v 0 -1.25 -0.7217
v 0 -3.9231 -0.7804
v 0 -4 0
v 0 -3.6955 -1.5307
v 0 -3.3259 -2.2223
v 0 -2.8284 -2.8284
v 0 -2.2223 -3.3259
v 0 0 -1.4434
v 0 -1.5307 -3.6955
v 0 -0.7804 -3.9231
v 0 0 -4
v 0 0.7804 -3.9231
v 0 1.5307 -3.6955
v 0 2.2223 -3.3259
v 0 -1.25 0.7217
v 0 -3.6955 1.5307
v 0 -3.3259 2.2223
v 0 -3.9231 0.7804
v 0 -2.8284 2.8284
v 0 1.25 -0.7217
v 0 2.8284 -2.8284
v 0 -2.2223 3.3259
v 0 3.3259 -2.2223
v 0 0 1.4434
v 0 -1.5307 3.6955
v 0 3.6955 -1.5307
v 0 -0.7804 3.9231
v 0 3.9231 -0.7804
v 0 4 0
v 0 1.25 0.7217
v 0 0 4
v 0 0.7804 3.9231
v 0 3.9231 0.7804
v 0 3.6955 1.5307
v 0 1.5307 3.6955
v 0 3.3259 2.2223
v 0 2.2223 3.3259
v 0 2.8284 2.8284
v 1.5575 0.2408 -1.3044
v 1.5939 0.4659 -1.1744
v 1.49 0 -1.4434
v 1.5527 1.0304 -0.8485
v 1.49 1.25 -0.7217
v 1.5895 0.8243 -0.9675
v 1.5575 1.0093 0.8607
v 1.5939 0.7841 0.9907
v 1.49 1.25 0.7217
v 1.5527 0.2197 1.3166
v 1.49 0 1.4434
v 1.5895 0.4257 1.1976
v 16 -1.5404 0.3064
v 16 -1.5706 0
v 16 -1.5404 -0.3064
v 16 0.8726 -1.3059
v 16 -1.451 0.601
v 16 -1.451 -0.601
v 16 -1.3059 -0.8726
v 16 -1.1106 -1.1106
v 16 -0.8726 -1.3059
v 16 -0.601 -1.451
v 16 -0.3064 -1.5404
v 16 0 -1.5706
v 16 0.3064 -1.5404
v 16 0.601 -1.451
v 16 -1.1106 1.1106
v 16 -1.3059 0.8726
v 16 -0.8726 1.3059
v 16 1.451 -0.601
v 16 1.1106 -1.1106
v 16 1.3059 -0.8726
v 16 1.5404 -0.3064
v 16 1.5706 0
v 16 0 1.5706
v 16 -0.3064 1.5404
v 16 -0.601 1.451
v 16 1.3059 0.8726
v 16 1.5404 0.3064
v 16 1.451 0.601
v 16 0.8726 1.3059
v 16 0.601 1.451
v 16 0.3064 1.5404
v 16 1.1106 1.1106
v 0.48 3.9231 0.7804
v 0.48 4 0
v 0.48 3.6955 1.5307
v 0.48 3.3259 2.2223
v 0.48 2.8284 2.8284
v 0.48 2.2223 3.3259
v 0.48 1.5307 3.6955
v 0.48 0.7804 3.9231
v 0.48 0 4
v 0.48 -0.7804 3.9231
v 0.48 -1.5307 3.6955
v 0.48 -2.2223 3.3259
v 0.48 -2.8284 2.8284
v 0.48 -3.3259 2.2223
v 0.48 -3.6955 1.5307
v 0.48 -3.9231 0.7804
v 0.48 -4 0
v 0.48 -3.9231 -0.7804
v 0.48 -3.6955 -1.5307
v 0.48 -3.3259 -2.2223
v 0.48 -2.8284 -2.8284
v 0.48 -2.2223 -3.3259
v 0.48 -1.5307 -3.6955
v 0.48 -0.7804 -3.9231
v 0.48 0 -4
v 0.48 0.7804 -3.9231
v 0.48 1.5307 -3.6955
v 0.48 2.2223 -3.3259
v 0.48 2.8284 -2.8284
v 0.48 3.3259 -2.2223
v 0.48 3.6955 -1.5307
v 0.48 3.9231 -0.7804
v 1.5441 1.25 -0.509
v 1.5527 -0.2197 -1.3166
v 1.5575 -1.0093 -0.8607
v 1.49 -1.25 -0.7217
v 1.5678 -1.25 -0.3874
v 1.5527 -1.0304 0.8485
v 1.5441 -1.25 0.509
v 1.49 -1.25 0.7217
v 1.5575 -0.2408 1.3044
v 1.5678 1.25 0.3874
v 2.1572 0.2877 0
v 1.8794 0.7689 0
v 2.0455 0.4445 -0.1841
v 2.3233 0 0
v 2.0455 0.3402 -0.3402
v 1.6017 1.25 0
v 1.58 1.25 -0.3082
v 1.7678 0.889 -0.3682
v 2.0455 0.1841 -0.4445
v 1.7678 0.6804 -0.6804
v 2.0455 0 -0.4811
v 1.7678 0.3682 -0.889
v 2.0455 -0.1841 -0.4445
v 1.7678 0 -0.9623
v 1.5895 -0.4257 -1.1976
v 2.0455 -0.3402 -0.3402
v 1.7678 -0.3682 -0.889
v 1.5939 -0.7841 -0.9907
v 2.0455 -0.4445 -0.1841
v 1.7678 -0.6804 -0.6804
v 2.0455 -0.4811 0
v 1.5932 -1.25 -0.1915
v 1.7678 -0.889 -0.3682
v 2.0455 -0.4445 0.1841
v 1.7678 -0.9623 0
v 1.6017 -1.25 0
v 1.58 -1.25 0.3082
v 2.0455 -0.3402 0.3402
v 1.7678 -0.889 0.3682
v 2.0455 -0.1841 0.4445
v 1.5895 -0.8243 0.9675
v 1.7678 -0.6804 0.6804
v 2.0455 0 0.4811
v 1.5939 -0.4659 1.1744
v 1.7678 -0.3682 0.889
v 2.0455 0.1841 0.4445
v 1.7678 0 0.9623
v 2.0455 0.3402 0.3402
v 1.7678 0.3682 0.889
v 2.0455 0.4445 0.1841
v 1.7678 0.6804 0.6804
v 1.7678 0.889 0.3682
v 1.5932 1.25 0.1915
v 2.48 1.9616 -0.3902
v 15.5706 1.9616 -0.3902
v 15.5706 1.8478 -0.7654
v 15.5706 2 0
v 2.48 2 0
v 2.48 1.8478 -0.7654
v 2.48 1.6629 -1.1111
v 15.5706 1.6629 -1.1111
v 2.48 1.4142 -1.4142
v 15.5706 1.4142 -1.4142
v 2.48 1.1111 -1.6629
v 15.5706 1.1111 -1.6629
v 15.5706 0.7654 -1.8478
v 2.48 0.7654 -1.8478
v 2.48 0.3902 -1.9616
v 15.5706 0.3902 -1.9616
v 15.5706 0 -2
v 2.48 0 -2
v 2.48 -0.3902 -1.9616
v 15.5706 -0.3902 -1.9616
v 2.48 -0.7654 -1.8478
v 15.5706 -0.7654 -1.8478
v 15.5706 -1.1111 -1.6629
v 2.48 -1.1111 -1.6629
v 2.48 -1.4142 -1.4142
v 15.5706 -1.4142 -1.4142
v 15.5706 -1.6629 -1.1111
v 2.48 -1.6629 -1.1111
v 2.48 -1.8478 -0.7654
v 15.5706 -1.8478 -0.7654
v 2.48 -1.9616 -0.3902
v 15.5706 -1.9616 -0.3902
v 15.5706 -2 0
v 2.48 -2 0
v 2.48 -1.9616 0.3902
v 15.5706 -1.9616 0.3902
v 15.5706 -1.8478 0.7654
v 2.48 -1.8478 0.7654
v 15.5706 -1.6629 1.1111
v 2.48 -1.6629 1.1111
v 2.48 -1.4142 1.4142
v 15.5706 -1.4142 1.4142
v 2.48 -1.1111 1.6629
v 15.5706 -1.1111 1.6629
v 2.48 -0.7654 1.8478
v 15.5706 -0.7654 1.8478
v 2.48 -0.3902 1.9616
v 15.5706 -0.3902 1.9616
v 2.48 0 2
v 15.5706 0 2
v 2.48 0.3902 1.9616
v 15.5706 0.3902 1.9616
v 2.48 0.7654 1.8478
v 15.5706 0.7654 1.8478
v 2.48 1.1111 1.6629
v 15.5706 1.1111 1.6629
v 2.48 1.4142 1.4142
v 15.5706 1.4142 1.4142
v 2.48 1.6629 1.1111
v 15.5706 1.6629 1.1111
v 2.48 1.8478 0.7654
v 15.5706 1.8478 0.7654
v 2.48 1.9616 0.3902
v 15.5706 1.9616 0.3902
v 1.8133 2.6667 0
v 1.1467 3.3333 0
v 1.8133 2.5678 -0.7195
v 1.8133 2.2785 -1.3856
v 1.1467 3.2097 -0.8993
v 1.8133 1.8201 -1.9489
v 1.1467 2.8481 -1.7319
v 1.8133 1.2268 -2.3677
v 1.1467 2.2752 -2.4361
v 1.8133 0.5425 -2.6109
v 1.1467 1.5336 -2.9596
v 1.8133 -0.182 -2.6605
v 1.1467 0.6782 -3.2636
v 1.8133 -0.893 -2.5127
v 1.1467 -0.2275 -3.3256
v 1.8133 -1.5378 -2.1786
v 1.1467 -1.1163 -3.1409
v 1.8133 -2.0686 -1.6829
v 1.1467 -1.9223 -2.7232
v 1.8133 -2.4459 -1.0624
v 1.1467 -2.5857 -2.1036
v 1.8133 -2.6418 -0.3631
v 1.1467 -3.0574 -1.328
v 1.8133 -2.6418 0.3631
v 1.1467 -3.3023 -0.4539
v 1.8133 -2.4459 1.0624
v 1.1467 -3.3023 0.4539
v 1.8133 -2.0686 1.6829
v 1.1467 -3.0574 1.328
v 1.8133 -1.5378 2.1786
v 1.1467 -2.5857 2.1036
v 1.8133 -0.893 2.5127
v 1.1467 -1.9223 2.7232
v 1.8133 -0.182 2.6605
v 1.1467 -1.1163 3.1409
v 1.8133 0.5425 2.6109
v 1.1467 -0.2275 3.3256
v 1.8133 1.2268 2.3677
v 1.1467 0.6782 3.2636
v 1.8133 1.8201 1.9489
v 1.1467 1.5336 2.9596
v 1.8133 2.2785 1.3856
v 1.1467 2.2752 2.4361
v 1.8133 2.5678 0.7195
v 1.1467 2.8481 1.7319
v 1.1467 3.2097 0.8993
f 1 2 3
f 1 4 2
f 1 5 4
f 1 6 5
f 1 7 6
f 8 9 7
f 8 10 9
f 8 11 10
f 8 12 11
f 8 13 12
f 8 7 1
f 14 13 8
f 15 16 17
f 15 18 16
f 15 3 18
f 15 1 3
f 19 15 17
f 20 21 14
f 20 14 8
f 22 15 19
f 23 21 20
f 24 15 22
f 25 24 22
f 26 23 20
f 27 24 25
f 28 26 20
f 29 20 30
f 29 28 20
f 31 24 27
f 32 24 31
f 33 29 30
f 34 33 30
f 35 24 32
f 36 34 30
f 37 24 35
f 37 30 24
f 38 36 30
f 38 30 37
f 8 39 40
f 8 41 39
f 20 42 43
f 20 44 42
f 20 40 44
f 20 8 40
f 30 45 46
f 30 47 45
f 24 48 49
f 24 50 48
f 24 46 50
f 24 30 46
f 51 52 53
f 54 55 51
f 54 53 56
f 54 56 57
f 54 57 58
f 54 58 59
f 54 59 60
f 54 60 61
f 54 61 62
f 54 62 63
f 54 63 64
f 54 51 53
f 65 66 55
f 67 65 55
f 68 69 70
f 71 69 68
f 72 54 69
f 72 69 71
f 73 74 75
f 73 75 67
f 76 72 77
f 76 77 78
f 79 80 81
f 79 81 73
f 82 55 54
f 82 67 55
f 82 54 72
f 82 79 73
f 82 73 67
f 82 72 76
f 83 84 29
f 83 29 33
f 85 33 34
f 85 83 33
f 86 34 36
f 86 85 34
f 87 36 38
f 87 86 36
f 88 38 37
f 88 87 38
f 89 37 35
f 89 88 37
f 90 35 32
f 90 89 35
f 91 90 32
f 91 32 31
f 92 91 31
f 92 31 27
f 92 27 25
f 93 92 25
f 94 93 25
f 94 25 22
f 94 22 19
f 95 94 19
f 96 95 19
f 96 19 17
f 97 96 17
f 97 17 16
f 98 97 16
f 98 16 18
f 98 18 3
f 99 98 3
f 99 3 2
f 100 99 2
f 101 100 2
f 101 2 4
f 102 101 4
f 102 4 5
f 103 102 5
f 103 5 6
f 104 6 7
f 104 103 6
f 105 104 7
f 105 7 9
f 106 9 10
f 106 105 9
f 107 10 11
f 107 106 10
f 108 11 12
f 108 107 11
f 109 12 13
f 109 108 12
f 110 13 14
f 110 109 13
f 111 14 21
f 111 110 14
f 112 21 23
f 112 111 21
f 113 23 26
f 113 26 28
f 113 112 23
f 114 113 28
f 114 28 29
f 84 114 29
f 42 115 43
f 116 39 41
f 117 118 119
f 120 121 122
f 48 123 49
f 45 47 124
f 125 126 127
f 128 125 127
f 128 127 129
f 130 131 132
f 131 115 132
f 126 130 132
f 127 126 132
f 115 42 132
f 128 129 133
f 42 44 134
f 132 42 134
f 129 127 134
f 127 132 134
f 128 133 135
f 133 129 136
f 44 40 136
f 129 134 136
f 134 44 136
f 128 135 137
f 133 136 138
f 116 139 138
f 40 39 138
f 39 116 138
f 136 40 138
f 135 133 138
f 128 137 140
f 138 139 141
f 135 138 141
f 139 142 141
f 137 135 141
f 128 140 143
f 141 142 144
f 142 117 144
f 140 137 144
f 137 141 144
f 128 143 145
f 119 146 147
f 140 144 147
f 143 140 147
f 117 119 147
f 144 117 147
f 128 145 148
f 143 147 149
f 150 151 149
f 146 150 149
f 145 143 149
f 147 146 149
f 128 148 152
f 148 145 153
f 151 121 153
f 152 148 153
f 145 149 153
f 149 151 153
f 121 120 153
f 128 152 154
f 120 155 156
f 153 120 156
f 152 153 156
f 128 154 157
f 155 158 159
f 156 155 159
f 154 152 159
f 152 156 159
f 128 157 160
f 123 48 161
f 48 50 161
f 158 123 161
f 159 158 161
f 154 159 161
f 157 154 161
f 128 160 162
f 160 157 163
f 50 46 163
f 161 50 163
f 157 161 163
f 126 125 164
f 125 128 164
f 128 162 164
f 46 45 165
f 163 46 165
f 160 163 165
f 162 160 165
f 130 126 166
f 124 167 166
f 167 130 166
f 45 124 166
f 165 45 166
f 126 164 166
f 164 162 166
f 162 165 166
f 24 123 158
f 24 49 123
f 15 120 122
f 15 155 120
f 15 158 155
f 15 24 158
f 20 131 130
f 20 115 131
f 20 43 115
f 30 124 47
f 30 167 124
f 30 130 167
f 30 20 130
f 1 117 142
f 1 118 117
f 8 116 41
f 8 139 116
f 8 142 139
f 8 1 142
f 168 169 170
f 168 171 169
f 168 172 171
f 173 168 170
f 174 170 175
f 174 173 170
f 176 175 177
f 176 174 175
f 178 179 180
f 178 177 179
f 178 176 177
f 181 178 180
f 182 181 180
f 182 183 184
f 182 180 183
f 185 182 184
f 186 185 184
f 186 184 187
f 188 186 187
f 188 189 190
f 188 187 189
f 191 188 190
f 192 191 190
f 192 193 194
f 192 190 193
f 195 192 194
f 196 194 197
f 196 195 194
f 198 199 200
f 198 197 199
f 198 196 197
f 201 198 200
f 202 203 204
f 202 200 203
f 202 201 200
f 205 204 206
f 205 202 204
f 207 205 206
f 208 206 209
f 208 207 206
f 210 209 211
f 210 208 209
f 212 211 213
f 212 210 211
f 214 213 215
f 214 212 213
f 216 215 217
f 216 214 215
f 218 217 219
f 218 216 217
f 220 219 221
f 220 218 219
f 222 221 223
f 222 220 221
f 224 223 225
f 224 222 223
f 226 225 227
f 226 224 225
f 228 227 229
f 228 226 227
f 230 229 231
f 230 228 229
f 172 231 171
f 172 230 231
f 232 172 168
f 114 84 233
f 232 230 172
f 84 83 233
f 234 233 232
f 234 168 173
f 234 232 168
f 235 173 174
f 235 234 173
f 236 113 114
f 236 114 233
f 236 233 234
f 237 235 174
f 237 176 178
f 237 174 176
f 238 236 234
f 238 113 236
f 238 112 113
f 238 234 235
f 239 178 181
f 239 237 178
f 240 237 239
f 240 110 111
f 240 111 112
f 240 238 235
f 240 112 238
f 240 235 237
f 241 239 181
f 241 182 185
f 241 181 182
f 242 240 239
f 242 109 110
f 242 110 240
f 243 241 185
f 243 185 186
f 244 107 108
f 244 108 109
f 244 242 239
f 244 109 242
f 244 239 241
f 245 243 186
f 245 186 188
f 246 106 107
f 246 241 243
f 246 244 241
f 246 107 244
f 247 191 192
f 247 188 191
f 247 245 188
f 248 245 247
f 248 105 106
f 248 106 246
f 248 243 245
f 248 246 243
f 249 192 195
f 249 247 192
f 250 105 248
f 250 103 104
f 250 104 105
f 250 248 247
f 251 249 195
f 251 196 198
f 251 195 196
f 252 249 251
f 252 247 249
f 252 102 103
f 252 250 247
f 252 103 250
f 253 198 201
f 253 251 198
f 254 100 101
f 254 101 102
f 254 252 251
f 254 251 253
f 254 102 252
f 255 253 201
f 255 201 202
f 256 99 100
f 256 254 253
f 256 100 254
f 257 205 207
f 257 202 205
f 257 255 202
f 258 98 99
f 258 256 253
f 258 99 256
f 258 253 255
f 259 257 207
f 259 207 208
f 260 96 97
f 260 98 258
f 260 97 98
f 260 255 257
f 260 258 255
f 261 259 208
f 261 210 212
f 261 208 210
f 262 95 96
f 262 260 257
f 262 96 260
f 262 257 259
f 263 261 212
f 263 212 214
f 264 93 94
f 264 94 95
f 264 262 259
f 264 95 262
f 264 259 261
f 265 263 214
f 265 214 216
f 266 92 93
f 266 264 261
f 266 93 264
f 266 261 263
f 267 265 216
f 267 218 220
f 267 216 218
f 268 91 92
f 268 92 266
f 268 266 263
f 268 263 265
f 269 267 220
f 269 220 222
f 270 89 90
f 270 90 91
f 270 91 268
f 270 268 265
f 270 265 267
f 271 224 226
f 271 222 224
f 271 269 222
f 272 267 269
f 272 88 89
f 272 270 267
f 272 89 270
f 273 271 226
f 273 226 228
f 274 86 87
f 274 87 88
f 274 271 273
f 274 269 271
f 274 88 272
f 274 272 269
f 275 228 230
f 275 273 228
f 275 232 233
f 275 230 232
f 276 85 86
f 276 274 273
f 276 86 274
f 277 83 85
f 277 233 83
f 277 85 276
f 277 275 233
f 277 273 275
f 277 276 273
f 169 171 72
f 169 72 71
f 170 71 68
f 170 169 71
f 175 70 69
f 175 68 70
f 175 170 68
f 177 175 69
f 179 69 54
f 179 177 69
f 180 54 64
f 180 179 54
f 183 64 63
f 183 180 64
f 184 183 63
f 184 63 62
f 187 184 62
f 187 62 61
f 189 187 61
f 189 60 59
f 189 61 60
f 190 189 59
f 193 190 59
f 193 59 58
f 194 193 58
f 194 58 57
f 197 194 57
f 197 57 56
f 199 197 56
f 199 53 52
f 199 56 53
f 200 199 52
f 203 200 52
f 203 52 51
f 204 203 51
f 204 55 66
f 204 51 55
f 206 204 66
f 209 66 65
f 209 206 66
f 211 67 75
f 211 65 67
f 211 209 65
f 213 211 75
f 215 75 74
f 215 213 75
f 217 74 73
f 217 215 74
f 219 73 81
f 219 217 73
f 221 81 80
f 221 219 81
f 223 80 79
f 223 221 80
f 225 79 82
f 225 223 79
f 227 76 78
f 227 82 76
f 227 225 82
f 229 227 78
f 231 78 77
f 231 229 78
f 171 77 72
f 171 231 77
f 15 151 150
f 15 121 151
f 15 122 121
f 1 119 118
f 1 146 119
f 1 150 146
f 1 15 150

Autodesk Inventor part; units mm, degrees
ref_plane "YZ Plane" through (0, 0, 0) normal (1, 0, 0) x (0, 1, 0)
ref_plane "XZ Plane" through (0, 0, 0) normal (0, 1, 0) x (-1, 0, 0)
sketch "Esquisse1" plane through (0, 0, 0) normal (0, 0, 1) x (1, 0, 0)
  line L0 (16, 0) -> (16, 2)
  line L1 (16, 2) -> (4.6, 2)
  line L2 (4.6, 2) -> (4.1706, 2)
  line L3 (0, 4) -> (0, 1.4434)
  line L4 (0, 1.4434) -> (1.49, 1.4434)
  line L5 (1.49, 1.4434) -> (2.3233, 0)
  line L6 (2.3233, 0) -> (16, 0)
  line L7 (0, 4) -> (0.48, 4)
  line L8 (0.48, 4) -> (2.48, 2)
  line L9 (4.1706, 2) -> (2.48, 2)
  line L10 (4.6, 2) -> (2.48, 2) construction
  line L11 (2.48, 2) -> (2.48, 2)
  line L12 (-3.2, 0) -> (19.2, 0) projected
  line L13 (0, -0.8) -> (0, 4.8) projected
  dimension "d0" = 16
  dimension "d1" = 11.4
  dimension "d2" = 1.49
  dimension "d3" = 4
  dimension "d6" = 2.48
  dimension "d7" = 45
  dimension "d8" = 2.8868
  dimension "d9" = 60
  dimension "d10" = 8
  dimension "d11" = 4
  dimension "d12" = 0.4294
revolve "Corps" add sketch "Esquisse1" angle 360 about axis through (2.3233, 0, 0) along (1, 0, 0) contours L6 L5 L4 L3 L7 L8 L9 L2 L1 L0
sketch "Esquisse2" plane through (0, 0, 0) normal (-1, 0, 0) x (0, 0, 1)
  circle A0 centre (0, 0) radius 1.4434 projected
  line L0 (0, -5.6) -> (0, 5.6) projected
  line L1 (-5.6, 0) -> (5.6, 0) projected
  line L2 (1.4434, 0) -> (0.7217, -1.25)
  line L3 (0.7217, -1.25) -> (-0.7217, -1.25)
  line L4 (-0.7217, -1.25) -> (-1.4434, 0)
  line L5 (-1.4434, 0) -> (-0.7217, 1.25)
  line L6 (-0.7217, 1.25) -> (0.7217, 1.25)
  line L7 (0.7217, 1.25) -> (1.4434, 0)
  point P0 (0, 1.4434)
extrude "Rainure" add sketch "Esquisse2" against normal up to next contours L7 A0 | A0 L2 | L6 L0 A0 | A0 L0 L3 | L0 L6 A0 | A0 L3 L0 | L4 A0 | A0 L5
thread "Filetage" size "M4x0.7" class "6g" standard "ISO Metric profile" length 11.4
chamfer "Chanfrein1" distance 0.4294 distance2 0.4294 1 edges at (16, -2, 0) measured on face at (16, 0.2227, -0.5871)
ref_plane "Work Plane1" through (104.775, 0, 0) normal (0, 0, -1) x (1, 0, 0)
equation "\"d15\" = GEL"
equation "\"d17\" = -0.5 * SPD + 0.5 * GD"
equation "\"d18\" = GUL"
equation "\"d0\" = NLG"
equation "\"d1\" = GEL"
equation "\"d2\" = INTI"
equation "\"d3\" = GD"
equation "\"d6\" = KOH"
equation "\"d7\" = 0.5 * SEWI"
equation "\"d8\" = 1.1547 * SW"
equation "\"d10\" = KOD"
equation "\"d11\" = BDM"
equation "\"d12\" = GAL"
equation "\"NLG\" = 16"
equation "\"INTI\" = 1.49"
equation "\"GEL\" = 11.4"
equation "\"GAL\" = 0.61345 * PTC"
equation "\"KOH\" = 2.48"
equation "\"KOD\" = 8"
equation "\"GUL\" = 0.61345 * PTC"
equation "\"SPD\" = NND - 1.2269 * PTC"
equation "\"BDM\" = NND"
equation "\"GD\" = NND"
equation "\"SEWI\" = 90deg"
equation "\"SW\" = 2.5"
equation "\"TOA\" = 30deg"
equation "\"GD1\" = THREADDIA - 1.2269 * PTC"
equation "\"EPV\" = 4.48"
equation "\"THREADDIA\" = 4"
equation "\"PTC\" = 0.7"
equation "\"NND\" = 4"
equation "\"E0\" = 1.155 * SW"
properties part number "BS 4168 - M4 x 16" material "Acier, doux"
